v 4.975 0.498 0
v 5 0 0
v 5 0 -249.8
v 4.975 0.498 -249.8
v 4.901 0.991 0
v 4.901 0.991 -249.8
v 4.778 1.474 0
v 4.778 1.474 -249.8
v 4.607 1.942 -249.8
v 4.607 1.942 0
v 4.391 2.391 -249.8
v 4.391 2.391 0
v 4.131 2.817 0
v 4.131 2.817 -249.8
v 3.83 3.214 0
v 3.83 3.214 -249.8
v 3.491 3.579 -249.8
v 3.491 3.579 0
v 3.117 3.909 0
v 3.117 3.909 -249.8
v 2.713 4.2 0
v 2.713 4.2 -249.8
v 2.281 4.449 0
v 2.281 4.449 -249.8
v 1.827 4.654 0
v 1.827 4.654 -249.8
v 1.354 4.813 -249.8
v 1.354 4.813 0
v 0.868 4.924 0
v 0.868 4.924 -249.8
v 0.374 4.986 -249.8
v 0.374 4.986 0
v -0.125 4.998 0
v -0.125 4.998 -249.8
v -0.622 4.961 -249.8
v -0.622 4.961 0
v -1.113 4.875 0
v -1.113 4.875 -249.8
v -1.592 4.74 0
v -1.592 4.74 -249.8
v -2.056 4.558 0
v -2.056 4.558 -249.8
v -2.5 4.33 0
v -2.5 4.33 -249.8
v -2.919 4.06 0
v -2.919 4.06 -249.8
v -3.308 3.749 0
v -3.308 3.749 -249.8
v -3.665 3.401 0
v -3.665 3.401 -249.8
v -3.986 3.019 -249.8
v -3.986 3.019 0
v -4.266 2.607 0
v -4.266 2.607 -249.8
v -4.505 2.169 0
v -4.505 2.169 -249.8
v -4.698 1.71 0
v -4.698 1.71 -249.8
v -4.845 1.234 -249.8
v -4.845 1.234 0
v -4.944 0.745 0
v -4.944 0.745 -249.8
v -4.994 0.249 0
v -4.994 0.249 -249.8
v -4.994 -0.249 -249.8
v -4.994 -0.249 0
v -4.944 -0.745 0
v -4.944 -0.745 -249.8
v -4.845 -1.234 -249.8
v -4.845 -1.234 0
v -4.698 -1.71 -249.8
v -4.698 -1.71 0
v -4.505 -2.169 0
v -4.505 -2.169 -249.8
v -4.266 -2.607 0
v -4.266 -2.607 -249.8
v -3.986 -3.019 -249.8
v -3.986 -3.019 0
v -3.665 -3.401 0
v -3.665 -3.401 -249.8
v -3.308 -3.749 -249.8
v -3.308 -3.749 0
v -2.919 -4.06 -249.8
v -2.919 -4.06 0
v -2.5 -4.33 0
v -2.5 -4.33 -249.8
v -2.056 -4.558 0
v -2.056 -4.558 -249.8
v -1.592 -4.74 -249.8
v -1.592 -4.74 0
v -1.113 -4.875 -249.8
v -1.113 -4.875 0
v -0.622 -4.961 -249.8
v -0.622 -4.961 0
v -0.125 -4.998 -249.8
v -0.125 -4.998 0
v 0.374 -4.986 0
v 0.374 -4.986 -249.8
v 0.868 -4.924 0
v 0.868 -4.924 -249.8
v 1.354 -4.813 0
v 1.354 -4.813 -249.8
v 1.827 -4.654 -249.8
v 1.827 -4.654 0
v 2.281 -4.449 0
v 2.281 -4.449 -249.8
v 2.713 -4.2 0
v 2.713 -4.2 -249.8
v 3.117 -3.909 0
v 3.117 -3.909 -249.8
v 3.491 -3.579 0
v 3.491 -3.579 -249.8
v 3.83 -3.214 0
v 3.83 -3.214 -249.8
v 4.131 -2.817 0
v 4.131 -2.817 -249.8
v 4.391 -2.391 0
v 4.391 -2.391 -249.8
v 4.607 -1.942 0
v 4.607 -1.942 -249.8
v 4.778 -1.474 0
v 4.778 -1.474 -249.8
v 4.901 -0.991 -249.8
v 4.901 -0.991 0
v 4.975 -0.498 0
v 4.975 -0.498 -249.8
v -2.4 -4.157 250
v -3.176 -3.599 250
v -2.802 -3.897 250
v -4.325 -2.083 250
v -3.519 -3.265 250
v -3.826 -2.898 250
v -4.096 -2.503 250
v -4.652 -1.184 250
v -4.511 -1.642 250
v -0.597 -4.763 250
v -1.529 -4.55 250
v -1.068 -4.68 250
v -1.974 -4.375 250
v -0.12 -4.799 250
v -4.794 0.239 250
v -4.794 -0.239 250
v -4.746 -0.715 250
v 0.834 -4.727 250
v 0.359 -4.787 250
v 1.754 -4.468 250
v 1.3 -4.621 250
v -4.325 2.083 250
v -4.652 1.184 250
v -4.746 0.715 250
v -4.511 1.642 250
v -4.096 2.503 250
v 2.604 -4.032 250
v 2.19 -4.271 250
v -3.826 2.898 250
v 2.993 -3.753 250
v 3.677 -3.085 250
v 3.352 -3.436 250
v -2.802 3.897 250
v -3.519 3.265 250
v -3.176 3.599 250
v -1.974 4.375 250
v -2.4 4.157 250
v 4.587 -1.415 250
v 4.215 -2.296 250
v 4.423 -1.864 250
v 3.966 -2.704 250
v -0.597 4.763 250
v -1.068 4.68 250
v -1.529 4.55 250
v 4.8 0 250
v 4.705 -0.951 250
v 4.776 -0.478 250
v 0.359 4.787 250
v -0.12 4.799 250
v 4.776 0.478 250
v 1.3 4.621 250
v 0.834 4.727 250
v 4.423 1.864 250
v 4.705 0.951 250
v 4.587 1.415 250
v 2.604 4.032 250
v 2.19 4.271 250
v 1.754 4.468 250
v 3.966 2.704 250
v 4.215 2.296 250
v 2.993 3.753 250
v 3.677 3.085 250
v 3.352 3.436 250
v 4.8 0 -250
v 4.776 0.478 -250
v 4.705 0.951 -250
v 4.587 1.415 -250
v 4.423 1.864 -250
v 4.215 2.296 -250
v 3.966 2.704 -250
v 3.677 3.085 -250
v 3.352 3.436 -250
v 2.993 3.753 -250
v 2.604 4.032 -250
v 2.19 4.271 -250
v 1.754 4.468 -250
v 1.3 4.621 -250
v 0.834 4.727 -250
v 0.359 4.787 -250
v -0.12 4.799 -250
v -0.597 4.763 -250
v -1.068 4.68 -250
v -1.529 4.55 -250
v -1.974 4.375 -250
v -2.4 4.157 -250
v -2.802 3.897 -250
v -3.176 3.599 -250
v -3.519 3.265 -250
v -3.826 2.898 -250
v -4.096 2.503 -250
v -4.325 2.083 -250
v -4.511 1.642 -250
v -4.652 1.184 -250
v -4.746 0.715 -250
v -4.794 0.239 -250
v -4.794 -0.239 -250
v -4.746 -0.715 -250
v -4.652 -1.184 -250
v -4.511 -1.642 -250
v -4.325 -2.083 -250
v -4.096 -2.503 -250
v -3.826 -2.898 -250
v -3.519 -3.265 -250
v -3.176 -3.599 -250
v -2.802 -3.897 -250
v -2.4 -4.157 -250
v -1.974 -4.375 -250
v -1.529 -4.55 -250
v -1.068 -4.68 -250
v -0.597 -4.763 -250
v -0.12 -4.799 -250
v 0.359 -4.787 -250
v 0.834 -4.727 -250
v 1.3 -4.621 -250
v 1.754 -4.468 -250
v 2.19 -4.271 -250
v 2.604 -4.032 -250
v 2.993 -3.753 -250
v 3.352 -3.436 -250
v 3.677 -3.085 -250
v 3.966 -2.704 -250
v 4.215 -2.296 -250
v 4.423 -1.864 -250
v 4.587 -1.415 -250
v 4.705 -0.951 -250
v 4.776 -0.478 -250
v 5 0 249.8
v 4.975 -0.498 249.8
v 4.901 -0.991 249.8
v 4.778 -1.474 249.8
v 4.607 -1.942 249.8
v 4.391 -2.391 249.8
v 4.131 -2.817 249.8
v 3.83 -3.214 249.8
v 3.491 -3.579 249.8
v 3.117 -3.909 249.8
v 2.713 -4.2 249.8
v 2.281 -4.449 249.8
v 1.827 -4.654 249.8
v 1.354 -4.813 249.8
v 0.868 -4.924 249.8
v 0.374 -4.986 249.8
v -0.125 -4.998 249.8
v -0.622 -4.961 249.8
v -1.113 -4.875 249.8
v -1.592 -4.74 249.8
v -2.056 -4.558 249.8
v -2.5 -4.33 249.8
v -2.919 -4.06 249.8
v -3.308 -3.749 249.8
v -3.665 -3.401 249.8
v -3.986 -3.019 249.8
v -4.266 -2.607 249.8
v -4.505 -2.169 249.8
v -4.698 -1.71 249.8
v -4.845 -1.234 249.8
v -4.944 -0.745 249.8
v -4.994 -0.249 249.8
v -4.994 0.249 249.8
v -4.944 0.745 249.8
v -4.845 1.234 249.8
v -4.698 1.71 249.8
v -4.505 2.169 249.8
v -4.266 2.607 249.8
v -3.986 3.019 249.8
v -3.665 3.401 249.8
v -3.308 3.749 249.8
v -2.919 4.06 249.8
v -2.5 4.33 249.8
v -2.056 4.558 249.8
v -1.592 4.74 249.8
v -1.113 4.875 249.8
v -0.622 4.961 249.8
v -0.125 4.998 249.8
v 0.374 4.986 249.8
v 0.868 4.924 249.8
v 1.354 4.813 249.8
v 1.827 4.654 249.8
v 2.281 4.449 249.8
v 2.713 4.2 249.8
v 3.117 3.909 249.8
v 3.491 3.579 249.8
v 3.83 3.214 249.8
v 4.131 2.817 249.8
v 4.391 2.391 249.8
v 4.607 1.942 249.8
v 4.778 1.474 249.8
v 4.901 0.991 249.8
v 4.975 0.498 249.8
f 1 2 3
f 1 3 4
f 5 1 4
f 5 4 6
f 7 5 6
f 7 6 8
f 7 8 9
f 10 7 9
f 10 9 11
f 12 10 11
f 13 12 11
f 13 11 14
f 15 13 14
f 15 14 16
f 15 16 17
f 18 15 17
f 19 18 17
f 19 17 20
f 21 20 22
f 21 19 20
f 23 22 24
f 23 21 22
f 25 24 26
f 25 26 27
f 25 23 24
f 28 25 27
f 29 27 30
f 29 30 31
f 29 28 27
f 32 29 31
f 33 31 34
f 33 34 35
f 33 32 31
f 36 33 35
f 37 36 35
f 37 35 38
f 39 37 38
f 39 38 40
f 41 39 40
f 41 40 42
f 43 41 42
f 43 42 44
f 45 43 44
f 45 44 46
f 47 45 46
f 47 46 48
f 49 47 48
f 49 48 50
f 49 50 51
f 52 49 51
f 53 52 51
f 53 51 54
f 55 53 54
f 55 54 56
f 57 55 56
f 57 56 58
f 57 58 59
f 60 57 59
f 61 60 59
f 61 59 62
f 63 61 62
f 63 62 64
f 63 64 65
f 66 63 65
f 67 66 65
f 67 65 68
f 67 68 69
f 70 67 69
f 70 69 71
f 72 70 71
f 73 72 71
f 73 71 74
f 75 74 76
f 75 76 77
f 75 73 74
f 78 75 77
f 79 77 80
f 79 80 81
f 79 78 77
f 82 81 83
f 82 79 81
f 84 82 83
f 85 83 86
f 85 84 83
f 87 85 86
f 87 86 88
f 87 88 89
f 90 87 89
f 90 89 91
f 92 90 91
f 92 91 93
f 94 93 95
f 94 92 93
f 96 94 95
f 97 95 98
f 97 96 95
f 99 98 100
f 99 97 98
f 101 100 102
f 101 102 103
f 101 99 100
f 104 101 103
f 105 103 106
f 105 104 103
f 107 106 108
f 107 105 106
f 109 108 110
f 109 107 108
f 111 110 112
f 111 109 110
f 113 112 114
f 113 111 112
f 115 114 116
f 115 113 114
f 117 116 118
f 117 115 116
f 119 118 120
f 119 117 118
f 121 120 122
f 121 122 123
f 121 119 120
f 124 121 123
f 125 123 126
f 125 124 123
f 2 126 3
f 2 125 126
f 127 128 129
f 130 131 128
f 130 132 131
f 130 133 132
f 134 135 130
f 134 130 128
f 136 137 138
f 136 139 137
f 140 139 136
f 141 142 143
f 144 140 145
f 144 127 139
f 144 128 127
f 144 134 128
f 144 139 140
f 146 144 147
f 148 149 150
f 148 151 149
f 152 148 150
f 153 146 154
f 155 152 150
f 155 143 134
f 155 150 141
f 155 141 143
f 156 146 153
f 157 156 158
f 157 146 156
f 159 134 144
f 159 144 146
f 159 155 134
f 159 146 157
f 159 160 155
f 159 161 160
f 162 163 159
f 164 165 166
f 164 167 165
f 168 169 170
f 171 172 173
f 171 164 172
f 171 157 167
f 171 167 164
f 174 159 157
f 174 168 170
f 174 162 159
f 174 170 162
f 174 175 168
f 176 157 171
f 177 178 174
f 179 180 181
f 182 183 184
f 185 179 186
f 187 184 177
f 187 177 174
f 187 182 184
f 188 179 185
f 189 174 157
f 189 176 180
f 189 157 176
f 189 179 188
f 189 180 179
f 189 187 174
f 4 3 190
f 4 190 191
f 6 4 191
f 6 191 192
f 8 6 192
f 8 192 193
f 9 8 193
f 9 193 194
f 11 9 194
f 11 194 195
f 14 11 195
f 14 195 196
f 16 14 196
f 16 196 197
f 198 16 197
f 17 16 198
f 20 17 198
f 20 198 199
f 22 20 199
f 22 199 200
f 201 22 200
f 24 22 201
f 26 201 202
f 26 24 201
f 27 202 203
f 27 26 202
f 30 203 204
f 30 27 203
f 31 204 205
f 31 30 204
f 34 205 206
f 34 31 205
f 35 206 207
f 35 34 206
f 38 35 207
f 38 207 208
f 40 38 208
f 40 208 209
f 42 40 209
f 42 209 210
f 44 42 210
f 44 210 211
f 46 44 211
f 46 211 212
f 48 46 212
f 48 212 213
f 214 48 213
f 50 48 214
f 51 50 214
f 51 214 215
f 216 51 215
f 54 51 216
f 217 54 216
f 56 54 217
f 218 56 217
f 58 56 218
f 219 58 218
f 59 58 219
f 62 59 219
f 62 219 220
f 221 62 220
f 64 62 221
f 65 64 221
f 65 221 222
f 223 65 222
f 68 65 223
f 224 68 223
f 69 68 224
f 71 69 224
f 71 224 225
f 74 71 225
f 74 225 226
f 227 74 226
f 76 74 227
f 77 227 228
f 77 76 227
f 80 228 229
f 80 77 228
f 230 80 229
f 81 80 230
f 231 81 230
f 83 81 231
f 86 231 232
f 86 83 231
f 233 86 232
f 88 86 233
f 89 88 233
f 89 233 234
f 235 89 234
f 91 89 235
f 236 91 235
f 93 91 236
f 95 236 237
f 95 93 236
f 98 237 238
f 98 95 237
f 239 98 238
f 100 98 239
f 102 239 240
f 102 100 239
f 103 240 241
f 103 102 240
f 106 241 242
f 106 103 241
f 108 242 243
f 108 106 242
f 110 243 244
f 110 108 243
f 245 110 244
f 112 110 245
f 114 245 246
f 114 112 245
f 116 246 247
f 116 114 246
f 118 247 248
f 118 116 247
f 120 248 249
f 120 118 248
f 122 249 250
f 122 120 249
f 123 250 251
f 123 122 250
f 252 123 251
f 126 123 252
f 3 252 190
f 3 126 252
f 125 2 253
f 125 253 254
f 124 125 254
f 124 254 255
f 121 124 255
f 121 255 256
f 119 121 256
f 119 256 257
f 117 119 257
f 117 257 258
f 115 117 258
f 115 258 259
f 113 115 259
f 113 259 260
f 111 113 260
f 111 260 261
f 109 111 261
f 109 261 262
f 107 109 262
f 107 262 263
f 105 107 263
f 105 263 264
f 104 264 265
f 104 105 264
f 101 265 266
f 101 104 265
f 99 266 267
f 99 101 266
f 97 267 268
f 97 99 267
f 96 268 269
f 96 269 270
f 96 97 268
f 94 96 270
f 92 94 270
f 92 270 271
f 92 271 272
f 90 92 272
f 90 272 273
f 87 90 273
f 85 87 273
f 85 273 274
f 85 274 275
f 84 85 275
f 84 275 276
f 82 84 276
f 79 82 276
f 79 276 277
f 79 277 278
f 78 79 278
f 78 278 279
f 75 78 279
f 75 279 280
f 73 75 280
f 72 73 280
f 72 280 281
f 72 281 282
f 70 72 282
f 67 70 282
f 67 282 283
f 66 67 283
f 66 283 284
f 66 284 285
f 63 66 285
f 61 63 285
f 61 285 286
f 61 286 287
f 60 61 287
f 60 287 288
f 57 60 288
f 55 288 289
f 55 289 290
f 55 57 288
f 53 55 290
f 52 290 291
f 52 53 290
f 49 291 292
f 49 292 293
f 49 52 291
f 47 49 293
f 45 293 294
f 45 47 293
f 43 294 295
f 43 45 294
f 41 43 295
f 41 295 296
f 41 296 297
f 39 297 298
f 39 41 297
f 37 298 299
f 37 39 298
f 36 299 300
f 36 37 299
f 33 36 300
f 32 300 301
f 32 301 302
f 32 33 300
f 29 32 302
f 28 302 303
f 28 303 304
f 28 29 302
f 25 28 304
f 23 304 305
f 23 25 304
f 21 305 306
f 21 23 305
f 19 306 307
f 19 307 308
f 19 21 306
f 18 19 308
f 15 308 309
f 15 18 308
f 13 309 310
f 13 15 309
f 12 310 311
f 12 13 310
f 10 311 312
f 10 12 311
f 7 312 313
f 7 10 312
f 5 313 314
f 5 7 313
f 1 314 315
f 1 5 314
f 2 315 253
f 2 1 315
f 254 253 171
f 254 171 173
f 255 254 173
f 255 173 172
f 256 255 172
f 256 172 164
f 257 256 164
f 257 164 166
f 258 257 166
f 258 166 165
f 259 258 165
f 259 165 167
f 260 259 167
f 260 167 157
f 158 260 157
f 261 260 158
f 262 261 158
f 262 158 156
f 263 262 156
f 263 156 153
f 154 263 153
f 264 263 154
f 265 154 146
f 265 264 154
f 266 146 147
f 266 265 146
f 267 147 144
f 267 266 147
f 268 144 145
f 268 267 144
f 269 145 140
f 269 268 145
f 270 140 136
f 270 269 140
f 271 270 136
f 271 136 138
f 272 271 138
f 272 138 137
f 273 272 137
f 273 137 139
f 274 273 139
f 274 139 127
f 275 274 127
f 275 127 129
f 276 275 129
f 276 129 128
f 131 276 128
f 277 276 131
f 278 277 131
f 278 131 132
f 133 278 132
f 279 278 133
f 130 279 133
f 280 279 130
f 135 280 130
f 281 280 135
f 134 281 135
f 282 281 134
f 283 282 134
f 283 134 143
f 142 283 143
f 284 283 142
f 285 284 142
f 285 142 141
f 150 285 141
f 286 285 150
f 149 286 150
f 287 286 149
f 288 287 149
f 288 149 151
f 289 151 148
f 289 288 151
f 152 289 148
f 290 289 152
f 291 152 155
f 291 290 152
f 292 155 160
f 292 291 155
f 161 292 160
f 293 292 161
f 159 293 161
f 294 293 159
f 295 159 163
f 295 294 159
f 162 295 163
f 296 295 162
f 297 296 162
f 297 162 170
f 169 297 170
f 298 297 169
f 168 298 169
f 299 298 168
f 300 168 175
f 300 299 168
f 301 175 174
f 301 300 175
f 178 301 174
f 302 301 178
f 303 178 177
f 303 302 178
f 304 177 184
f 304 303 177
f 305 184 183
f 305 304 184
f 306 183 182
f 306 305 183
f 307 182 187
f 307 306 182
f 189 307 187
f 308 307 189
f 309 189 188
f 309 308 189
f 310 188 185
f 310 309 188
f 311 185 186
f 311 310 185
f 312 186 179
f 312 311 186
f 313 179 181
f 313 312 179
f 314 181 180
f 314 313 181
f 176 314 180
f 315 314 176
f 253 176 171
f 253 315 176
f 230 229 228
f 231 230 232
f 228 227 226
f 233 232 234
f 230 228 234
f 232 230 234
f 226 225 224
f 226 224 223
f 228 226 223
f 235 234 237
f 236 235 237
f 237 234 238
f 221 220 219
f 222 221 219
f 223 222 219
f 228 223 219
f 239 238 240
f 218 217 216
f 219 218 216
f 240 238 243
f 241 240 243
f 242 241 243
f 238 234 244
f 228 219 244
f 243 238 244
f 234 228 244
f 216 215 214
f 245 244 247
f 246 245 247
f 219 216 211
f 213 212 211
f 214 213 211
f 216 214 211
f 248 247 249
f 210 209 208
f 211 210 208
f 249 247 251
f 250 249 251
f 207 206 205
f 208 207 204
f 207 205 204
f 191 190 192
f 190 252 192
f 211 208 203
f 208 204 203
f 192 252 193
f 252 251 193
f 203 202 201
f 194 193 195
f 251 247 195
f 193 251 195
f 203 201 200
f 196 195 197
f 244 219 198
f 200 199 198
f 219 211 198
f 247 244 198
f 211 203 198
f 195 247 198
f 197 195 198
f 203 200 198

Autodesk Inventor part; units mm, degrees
ref_plane "YZ Plane" through (0, 0, 0) normal (1, 0, 0) x (0, 1, 0)
ref_plane "XZ Plane" through (0, 0, 0) normal (0, 1, 0) x (-1, 0, 0)
ref_plane "XY Plane" through (0, 0, 0) normal (0, 0, 1) x (1, 0, 0)
sketch "Skizze1" plane through (0, 0, 0) normal (0, 0, 1) x (1, 0, 0)
  line L0 (0, -7) -> (0, 7) projected
  line L1 (-7, 0) -> (7, 0) projected
  circle A0 centre (0, 0) radius 5
  dimension "d0" = 10
extrude "Extrusion1" add sketch "Skizze1" along normal mid plane 500
chamfer "Fase1" distance 0.2 angle 45 1 edges at (-5, 0, 250)
chamfer "Fase2" distance 0.2 angle 45 1 edges at (-5, 0, -250)
properties part number "10mm_Alu_Linearwelle_500mm" material "Aluminum 6061-AHC"
